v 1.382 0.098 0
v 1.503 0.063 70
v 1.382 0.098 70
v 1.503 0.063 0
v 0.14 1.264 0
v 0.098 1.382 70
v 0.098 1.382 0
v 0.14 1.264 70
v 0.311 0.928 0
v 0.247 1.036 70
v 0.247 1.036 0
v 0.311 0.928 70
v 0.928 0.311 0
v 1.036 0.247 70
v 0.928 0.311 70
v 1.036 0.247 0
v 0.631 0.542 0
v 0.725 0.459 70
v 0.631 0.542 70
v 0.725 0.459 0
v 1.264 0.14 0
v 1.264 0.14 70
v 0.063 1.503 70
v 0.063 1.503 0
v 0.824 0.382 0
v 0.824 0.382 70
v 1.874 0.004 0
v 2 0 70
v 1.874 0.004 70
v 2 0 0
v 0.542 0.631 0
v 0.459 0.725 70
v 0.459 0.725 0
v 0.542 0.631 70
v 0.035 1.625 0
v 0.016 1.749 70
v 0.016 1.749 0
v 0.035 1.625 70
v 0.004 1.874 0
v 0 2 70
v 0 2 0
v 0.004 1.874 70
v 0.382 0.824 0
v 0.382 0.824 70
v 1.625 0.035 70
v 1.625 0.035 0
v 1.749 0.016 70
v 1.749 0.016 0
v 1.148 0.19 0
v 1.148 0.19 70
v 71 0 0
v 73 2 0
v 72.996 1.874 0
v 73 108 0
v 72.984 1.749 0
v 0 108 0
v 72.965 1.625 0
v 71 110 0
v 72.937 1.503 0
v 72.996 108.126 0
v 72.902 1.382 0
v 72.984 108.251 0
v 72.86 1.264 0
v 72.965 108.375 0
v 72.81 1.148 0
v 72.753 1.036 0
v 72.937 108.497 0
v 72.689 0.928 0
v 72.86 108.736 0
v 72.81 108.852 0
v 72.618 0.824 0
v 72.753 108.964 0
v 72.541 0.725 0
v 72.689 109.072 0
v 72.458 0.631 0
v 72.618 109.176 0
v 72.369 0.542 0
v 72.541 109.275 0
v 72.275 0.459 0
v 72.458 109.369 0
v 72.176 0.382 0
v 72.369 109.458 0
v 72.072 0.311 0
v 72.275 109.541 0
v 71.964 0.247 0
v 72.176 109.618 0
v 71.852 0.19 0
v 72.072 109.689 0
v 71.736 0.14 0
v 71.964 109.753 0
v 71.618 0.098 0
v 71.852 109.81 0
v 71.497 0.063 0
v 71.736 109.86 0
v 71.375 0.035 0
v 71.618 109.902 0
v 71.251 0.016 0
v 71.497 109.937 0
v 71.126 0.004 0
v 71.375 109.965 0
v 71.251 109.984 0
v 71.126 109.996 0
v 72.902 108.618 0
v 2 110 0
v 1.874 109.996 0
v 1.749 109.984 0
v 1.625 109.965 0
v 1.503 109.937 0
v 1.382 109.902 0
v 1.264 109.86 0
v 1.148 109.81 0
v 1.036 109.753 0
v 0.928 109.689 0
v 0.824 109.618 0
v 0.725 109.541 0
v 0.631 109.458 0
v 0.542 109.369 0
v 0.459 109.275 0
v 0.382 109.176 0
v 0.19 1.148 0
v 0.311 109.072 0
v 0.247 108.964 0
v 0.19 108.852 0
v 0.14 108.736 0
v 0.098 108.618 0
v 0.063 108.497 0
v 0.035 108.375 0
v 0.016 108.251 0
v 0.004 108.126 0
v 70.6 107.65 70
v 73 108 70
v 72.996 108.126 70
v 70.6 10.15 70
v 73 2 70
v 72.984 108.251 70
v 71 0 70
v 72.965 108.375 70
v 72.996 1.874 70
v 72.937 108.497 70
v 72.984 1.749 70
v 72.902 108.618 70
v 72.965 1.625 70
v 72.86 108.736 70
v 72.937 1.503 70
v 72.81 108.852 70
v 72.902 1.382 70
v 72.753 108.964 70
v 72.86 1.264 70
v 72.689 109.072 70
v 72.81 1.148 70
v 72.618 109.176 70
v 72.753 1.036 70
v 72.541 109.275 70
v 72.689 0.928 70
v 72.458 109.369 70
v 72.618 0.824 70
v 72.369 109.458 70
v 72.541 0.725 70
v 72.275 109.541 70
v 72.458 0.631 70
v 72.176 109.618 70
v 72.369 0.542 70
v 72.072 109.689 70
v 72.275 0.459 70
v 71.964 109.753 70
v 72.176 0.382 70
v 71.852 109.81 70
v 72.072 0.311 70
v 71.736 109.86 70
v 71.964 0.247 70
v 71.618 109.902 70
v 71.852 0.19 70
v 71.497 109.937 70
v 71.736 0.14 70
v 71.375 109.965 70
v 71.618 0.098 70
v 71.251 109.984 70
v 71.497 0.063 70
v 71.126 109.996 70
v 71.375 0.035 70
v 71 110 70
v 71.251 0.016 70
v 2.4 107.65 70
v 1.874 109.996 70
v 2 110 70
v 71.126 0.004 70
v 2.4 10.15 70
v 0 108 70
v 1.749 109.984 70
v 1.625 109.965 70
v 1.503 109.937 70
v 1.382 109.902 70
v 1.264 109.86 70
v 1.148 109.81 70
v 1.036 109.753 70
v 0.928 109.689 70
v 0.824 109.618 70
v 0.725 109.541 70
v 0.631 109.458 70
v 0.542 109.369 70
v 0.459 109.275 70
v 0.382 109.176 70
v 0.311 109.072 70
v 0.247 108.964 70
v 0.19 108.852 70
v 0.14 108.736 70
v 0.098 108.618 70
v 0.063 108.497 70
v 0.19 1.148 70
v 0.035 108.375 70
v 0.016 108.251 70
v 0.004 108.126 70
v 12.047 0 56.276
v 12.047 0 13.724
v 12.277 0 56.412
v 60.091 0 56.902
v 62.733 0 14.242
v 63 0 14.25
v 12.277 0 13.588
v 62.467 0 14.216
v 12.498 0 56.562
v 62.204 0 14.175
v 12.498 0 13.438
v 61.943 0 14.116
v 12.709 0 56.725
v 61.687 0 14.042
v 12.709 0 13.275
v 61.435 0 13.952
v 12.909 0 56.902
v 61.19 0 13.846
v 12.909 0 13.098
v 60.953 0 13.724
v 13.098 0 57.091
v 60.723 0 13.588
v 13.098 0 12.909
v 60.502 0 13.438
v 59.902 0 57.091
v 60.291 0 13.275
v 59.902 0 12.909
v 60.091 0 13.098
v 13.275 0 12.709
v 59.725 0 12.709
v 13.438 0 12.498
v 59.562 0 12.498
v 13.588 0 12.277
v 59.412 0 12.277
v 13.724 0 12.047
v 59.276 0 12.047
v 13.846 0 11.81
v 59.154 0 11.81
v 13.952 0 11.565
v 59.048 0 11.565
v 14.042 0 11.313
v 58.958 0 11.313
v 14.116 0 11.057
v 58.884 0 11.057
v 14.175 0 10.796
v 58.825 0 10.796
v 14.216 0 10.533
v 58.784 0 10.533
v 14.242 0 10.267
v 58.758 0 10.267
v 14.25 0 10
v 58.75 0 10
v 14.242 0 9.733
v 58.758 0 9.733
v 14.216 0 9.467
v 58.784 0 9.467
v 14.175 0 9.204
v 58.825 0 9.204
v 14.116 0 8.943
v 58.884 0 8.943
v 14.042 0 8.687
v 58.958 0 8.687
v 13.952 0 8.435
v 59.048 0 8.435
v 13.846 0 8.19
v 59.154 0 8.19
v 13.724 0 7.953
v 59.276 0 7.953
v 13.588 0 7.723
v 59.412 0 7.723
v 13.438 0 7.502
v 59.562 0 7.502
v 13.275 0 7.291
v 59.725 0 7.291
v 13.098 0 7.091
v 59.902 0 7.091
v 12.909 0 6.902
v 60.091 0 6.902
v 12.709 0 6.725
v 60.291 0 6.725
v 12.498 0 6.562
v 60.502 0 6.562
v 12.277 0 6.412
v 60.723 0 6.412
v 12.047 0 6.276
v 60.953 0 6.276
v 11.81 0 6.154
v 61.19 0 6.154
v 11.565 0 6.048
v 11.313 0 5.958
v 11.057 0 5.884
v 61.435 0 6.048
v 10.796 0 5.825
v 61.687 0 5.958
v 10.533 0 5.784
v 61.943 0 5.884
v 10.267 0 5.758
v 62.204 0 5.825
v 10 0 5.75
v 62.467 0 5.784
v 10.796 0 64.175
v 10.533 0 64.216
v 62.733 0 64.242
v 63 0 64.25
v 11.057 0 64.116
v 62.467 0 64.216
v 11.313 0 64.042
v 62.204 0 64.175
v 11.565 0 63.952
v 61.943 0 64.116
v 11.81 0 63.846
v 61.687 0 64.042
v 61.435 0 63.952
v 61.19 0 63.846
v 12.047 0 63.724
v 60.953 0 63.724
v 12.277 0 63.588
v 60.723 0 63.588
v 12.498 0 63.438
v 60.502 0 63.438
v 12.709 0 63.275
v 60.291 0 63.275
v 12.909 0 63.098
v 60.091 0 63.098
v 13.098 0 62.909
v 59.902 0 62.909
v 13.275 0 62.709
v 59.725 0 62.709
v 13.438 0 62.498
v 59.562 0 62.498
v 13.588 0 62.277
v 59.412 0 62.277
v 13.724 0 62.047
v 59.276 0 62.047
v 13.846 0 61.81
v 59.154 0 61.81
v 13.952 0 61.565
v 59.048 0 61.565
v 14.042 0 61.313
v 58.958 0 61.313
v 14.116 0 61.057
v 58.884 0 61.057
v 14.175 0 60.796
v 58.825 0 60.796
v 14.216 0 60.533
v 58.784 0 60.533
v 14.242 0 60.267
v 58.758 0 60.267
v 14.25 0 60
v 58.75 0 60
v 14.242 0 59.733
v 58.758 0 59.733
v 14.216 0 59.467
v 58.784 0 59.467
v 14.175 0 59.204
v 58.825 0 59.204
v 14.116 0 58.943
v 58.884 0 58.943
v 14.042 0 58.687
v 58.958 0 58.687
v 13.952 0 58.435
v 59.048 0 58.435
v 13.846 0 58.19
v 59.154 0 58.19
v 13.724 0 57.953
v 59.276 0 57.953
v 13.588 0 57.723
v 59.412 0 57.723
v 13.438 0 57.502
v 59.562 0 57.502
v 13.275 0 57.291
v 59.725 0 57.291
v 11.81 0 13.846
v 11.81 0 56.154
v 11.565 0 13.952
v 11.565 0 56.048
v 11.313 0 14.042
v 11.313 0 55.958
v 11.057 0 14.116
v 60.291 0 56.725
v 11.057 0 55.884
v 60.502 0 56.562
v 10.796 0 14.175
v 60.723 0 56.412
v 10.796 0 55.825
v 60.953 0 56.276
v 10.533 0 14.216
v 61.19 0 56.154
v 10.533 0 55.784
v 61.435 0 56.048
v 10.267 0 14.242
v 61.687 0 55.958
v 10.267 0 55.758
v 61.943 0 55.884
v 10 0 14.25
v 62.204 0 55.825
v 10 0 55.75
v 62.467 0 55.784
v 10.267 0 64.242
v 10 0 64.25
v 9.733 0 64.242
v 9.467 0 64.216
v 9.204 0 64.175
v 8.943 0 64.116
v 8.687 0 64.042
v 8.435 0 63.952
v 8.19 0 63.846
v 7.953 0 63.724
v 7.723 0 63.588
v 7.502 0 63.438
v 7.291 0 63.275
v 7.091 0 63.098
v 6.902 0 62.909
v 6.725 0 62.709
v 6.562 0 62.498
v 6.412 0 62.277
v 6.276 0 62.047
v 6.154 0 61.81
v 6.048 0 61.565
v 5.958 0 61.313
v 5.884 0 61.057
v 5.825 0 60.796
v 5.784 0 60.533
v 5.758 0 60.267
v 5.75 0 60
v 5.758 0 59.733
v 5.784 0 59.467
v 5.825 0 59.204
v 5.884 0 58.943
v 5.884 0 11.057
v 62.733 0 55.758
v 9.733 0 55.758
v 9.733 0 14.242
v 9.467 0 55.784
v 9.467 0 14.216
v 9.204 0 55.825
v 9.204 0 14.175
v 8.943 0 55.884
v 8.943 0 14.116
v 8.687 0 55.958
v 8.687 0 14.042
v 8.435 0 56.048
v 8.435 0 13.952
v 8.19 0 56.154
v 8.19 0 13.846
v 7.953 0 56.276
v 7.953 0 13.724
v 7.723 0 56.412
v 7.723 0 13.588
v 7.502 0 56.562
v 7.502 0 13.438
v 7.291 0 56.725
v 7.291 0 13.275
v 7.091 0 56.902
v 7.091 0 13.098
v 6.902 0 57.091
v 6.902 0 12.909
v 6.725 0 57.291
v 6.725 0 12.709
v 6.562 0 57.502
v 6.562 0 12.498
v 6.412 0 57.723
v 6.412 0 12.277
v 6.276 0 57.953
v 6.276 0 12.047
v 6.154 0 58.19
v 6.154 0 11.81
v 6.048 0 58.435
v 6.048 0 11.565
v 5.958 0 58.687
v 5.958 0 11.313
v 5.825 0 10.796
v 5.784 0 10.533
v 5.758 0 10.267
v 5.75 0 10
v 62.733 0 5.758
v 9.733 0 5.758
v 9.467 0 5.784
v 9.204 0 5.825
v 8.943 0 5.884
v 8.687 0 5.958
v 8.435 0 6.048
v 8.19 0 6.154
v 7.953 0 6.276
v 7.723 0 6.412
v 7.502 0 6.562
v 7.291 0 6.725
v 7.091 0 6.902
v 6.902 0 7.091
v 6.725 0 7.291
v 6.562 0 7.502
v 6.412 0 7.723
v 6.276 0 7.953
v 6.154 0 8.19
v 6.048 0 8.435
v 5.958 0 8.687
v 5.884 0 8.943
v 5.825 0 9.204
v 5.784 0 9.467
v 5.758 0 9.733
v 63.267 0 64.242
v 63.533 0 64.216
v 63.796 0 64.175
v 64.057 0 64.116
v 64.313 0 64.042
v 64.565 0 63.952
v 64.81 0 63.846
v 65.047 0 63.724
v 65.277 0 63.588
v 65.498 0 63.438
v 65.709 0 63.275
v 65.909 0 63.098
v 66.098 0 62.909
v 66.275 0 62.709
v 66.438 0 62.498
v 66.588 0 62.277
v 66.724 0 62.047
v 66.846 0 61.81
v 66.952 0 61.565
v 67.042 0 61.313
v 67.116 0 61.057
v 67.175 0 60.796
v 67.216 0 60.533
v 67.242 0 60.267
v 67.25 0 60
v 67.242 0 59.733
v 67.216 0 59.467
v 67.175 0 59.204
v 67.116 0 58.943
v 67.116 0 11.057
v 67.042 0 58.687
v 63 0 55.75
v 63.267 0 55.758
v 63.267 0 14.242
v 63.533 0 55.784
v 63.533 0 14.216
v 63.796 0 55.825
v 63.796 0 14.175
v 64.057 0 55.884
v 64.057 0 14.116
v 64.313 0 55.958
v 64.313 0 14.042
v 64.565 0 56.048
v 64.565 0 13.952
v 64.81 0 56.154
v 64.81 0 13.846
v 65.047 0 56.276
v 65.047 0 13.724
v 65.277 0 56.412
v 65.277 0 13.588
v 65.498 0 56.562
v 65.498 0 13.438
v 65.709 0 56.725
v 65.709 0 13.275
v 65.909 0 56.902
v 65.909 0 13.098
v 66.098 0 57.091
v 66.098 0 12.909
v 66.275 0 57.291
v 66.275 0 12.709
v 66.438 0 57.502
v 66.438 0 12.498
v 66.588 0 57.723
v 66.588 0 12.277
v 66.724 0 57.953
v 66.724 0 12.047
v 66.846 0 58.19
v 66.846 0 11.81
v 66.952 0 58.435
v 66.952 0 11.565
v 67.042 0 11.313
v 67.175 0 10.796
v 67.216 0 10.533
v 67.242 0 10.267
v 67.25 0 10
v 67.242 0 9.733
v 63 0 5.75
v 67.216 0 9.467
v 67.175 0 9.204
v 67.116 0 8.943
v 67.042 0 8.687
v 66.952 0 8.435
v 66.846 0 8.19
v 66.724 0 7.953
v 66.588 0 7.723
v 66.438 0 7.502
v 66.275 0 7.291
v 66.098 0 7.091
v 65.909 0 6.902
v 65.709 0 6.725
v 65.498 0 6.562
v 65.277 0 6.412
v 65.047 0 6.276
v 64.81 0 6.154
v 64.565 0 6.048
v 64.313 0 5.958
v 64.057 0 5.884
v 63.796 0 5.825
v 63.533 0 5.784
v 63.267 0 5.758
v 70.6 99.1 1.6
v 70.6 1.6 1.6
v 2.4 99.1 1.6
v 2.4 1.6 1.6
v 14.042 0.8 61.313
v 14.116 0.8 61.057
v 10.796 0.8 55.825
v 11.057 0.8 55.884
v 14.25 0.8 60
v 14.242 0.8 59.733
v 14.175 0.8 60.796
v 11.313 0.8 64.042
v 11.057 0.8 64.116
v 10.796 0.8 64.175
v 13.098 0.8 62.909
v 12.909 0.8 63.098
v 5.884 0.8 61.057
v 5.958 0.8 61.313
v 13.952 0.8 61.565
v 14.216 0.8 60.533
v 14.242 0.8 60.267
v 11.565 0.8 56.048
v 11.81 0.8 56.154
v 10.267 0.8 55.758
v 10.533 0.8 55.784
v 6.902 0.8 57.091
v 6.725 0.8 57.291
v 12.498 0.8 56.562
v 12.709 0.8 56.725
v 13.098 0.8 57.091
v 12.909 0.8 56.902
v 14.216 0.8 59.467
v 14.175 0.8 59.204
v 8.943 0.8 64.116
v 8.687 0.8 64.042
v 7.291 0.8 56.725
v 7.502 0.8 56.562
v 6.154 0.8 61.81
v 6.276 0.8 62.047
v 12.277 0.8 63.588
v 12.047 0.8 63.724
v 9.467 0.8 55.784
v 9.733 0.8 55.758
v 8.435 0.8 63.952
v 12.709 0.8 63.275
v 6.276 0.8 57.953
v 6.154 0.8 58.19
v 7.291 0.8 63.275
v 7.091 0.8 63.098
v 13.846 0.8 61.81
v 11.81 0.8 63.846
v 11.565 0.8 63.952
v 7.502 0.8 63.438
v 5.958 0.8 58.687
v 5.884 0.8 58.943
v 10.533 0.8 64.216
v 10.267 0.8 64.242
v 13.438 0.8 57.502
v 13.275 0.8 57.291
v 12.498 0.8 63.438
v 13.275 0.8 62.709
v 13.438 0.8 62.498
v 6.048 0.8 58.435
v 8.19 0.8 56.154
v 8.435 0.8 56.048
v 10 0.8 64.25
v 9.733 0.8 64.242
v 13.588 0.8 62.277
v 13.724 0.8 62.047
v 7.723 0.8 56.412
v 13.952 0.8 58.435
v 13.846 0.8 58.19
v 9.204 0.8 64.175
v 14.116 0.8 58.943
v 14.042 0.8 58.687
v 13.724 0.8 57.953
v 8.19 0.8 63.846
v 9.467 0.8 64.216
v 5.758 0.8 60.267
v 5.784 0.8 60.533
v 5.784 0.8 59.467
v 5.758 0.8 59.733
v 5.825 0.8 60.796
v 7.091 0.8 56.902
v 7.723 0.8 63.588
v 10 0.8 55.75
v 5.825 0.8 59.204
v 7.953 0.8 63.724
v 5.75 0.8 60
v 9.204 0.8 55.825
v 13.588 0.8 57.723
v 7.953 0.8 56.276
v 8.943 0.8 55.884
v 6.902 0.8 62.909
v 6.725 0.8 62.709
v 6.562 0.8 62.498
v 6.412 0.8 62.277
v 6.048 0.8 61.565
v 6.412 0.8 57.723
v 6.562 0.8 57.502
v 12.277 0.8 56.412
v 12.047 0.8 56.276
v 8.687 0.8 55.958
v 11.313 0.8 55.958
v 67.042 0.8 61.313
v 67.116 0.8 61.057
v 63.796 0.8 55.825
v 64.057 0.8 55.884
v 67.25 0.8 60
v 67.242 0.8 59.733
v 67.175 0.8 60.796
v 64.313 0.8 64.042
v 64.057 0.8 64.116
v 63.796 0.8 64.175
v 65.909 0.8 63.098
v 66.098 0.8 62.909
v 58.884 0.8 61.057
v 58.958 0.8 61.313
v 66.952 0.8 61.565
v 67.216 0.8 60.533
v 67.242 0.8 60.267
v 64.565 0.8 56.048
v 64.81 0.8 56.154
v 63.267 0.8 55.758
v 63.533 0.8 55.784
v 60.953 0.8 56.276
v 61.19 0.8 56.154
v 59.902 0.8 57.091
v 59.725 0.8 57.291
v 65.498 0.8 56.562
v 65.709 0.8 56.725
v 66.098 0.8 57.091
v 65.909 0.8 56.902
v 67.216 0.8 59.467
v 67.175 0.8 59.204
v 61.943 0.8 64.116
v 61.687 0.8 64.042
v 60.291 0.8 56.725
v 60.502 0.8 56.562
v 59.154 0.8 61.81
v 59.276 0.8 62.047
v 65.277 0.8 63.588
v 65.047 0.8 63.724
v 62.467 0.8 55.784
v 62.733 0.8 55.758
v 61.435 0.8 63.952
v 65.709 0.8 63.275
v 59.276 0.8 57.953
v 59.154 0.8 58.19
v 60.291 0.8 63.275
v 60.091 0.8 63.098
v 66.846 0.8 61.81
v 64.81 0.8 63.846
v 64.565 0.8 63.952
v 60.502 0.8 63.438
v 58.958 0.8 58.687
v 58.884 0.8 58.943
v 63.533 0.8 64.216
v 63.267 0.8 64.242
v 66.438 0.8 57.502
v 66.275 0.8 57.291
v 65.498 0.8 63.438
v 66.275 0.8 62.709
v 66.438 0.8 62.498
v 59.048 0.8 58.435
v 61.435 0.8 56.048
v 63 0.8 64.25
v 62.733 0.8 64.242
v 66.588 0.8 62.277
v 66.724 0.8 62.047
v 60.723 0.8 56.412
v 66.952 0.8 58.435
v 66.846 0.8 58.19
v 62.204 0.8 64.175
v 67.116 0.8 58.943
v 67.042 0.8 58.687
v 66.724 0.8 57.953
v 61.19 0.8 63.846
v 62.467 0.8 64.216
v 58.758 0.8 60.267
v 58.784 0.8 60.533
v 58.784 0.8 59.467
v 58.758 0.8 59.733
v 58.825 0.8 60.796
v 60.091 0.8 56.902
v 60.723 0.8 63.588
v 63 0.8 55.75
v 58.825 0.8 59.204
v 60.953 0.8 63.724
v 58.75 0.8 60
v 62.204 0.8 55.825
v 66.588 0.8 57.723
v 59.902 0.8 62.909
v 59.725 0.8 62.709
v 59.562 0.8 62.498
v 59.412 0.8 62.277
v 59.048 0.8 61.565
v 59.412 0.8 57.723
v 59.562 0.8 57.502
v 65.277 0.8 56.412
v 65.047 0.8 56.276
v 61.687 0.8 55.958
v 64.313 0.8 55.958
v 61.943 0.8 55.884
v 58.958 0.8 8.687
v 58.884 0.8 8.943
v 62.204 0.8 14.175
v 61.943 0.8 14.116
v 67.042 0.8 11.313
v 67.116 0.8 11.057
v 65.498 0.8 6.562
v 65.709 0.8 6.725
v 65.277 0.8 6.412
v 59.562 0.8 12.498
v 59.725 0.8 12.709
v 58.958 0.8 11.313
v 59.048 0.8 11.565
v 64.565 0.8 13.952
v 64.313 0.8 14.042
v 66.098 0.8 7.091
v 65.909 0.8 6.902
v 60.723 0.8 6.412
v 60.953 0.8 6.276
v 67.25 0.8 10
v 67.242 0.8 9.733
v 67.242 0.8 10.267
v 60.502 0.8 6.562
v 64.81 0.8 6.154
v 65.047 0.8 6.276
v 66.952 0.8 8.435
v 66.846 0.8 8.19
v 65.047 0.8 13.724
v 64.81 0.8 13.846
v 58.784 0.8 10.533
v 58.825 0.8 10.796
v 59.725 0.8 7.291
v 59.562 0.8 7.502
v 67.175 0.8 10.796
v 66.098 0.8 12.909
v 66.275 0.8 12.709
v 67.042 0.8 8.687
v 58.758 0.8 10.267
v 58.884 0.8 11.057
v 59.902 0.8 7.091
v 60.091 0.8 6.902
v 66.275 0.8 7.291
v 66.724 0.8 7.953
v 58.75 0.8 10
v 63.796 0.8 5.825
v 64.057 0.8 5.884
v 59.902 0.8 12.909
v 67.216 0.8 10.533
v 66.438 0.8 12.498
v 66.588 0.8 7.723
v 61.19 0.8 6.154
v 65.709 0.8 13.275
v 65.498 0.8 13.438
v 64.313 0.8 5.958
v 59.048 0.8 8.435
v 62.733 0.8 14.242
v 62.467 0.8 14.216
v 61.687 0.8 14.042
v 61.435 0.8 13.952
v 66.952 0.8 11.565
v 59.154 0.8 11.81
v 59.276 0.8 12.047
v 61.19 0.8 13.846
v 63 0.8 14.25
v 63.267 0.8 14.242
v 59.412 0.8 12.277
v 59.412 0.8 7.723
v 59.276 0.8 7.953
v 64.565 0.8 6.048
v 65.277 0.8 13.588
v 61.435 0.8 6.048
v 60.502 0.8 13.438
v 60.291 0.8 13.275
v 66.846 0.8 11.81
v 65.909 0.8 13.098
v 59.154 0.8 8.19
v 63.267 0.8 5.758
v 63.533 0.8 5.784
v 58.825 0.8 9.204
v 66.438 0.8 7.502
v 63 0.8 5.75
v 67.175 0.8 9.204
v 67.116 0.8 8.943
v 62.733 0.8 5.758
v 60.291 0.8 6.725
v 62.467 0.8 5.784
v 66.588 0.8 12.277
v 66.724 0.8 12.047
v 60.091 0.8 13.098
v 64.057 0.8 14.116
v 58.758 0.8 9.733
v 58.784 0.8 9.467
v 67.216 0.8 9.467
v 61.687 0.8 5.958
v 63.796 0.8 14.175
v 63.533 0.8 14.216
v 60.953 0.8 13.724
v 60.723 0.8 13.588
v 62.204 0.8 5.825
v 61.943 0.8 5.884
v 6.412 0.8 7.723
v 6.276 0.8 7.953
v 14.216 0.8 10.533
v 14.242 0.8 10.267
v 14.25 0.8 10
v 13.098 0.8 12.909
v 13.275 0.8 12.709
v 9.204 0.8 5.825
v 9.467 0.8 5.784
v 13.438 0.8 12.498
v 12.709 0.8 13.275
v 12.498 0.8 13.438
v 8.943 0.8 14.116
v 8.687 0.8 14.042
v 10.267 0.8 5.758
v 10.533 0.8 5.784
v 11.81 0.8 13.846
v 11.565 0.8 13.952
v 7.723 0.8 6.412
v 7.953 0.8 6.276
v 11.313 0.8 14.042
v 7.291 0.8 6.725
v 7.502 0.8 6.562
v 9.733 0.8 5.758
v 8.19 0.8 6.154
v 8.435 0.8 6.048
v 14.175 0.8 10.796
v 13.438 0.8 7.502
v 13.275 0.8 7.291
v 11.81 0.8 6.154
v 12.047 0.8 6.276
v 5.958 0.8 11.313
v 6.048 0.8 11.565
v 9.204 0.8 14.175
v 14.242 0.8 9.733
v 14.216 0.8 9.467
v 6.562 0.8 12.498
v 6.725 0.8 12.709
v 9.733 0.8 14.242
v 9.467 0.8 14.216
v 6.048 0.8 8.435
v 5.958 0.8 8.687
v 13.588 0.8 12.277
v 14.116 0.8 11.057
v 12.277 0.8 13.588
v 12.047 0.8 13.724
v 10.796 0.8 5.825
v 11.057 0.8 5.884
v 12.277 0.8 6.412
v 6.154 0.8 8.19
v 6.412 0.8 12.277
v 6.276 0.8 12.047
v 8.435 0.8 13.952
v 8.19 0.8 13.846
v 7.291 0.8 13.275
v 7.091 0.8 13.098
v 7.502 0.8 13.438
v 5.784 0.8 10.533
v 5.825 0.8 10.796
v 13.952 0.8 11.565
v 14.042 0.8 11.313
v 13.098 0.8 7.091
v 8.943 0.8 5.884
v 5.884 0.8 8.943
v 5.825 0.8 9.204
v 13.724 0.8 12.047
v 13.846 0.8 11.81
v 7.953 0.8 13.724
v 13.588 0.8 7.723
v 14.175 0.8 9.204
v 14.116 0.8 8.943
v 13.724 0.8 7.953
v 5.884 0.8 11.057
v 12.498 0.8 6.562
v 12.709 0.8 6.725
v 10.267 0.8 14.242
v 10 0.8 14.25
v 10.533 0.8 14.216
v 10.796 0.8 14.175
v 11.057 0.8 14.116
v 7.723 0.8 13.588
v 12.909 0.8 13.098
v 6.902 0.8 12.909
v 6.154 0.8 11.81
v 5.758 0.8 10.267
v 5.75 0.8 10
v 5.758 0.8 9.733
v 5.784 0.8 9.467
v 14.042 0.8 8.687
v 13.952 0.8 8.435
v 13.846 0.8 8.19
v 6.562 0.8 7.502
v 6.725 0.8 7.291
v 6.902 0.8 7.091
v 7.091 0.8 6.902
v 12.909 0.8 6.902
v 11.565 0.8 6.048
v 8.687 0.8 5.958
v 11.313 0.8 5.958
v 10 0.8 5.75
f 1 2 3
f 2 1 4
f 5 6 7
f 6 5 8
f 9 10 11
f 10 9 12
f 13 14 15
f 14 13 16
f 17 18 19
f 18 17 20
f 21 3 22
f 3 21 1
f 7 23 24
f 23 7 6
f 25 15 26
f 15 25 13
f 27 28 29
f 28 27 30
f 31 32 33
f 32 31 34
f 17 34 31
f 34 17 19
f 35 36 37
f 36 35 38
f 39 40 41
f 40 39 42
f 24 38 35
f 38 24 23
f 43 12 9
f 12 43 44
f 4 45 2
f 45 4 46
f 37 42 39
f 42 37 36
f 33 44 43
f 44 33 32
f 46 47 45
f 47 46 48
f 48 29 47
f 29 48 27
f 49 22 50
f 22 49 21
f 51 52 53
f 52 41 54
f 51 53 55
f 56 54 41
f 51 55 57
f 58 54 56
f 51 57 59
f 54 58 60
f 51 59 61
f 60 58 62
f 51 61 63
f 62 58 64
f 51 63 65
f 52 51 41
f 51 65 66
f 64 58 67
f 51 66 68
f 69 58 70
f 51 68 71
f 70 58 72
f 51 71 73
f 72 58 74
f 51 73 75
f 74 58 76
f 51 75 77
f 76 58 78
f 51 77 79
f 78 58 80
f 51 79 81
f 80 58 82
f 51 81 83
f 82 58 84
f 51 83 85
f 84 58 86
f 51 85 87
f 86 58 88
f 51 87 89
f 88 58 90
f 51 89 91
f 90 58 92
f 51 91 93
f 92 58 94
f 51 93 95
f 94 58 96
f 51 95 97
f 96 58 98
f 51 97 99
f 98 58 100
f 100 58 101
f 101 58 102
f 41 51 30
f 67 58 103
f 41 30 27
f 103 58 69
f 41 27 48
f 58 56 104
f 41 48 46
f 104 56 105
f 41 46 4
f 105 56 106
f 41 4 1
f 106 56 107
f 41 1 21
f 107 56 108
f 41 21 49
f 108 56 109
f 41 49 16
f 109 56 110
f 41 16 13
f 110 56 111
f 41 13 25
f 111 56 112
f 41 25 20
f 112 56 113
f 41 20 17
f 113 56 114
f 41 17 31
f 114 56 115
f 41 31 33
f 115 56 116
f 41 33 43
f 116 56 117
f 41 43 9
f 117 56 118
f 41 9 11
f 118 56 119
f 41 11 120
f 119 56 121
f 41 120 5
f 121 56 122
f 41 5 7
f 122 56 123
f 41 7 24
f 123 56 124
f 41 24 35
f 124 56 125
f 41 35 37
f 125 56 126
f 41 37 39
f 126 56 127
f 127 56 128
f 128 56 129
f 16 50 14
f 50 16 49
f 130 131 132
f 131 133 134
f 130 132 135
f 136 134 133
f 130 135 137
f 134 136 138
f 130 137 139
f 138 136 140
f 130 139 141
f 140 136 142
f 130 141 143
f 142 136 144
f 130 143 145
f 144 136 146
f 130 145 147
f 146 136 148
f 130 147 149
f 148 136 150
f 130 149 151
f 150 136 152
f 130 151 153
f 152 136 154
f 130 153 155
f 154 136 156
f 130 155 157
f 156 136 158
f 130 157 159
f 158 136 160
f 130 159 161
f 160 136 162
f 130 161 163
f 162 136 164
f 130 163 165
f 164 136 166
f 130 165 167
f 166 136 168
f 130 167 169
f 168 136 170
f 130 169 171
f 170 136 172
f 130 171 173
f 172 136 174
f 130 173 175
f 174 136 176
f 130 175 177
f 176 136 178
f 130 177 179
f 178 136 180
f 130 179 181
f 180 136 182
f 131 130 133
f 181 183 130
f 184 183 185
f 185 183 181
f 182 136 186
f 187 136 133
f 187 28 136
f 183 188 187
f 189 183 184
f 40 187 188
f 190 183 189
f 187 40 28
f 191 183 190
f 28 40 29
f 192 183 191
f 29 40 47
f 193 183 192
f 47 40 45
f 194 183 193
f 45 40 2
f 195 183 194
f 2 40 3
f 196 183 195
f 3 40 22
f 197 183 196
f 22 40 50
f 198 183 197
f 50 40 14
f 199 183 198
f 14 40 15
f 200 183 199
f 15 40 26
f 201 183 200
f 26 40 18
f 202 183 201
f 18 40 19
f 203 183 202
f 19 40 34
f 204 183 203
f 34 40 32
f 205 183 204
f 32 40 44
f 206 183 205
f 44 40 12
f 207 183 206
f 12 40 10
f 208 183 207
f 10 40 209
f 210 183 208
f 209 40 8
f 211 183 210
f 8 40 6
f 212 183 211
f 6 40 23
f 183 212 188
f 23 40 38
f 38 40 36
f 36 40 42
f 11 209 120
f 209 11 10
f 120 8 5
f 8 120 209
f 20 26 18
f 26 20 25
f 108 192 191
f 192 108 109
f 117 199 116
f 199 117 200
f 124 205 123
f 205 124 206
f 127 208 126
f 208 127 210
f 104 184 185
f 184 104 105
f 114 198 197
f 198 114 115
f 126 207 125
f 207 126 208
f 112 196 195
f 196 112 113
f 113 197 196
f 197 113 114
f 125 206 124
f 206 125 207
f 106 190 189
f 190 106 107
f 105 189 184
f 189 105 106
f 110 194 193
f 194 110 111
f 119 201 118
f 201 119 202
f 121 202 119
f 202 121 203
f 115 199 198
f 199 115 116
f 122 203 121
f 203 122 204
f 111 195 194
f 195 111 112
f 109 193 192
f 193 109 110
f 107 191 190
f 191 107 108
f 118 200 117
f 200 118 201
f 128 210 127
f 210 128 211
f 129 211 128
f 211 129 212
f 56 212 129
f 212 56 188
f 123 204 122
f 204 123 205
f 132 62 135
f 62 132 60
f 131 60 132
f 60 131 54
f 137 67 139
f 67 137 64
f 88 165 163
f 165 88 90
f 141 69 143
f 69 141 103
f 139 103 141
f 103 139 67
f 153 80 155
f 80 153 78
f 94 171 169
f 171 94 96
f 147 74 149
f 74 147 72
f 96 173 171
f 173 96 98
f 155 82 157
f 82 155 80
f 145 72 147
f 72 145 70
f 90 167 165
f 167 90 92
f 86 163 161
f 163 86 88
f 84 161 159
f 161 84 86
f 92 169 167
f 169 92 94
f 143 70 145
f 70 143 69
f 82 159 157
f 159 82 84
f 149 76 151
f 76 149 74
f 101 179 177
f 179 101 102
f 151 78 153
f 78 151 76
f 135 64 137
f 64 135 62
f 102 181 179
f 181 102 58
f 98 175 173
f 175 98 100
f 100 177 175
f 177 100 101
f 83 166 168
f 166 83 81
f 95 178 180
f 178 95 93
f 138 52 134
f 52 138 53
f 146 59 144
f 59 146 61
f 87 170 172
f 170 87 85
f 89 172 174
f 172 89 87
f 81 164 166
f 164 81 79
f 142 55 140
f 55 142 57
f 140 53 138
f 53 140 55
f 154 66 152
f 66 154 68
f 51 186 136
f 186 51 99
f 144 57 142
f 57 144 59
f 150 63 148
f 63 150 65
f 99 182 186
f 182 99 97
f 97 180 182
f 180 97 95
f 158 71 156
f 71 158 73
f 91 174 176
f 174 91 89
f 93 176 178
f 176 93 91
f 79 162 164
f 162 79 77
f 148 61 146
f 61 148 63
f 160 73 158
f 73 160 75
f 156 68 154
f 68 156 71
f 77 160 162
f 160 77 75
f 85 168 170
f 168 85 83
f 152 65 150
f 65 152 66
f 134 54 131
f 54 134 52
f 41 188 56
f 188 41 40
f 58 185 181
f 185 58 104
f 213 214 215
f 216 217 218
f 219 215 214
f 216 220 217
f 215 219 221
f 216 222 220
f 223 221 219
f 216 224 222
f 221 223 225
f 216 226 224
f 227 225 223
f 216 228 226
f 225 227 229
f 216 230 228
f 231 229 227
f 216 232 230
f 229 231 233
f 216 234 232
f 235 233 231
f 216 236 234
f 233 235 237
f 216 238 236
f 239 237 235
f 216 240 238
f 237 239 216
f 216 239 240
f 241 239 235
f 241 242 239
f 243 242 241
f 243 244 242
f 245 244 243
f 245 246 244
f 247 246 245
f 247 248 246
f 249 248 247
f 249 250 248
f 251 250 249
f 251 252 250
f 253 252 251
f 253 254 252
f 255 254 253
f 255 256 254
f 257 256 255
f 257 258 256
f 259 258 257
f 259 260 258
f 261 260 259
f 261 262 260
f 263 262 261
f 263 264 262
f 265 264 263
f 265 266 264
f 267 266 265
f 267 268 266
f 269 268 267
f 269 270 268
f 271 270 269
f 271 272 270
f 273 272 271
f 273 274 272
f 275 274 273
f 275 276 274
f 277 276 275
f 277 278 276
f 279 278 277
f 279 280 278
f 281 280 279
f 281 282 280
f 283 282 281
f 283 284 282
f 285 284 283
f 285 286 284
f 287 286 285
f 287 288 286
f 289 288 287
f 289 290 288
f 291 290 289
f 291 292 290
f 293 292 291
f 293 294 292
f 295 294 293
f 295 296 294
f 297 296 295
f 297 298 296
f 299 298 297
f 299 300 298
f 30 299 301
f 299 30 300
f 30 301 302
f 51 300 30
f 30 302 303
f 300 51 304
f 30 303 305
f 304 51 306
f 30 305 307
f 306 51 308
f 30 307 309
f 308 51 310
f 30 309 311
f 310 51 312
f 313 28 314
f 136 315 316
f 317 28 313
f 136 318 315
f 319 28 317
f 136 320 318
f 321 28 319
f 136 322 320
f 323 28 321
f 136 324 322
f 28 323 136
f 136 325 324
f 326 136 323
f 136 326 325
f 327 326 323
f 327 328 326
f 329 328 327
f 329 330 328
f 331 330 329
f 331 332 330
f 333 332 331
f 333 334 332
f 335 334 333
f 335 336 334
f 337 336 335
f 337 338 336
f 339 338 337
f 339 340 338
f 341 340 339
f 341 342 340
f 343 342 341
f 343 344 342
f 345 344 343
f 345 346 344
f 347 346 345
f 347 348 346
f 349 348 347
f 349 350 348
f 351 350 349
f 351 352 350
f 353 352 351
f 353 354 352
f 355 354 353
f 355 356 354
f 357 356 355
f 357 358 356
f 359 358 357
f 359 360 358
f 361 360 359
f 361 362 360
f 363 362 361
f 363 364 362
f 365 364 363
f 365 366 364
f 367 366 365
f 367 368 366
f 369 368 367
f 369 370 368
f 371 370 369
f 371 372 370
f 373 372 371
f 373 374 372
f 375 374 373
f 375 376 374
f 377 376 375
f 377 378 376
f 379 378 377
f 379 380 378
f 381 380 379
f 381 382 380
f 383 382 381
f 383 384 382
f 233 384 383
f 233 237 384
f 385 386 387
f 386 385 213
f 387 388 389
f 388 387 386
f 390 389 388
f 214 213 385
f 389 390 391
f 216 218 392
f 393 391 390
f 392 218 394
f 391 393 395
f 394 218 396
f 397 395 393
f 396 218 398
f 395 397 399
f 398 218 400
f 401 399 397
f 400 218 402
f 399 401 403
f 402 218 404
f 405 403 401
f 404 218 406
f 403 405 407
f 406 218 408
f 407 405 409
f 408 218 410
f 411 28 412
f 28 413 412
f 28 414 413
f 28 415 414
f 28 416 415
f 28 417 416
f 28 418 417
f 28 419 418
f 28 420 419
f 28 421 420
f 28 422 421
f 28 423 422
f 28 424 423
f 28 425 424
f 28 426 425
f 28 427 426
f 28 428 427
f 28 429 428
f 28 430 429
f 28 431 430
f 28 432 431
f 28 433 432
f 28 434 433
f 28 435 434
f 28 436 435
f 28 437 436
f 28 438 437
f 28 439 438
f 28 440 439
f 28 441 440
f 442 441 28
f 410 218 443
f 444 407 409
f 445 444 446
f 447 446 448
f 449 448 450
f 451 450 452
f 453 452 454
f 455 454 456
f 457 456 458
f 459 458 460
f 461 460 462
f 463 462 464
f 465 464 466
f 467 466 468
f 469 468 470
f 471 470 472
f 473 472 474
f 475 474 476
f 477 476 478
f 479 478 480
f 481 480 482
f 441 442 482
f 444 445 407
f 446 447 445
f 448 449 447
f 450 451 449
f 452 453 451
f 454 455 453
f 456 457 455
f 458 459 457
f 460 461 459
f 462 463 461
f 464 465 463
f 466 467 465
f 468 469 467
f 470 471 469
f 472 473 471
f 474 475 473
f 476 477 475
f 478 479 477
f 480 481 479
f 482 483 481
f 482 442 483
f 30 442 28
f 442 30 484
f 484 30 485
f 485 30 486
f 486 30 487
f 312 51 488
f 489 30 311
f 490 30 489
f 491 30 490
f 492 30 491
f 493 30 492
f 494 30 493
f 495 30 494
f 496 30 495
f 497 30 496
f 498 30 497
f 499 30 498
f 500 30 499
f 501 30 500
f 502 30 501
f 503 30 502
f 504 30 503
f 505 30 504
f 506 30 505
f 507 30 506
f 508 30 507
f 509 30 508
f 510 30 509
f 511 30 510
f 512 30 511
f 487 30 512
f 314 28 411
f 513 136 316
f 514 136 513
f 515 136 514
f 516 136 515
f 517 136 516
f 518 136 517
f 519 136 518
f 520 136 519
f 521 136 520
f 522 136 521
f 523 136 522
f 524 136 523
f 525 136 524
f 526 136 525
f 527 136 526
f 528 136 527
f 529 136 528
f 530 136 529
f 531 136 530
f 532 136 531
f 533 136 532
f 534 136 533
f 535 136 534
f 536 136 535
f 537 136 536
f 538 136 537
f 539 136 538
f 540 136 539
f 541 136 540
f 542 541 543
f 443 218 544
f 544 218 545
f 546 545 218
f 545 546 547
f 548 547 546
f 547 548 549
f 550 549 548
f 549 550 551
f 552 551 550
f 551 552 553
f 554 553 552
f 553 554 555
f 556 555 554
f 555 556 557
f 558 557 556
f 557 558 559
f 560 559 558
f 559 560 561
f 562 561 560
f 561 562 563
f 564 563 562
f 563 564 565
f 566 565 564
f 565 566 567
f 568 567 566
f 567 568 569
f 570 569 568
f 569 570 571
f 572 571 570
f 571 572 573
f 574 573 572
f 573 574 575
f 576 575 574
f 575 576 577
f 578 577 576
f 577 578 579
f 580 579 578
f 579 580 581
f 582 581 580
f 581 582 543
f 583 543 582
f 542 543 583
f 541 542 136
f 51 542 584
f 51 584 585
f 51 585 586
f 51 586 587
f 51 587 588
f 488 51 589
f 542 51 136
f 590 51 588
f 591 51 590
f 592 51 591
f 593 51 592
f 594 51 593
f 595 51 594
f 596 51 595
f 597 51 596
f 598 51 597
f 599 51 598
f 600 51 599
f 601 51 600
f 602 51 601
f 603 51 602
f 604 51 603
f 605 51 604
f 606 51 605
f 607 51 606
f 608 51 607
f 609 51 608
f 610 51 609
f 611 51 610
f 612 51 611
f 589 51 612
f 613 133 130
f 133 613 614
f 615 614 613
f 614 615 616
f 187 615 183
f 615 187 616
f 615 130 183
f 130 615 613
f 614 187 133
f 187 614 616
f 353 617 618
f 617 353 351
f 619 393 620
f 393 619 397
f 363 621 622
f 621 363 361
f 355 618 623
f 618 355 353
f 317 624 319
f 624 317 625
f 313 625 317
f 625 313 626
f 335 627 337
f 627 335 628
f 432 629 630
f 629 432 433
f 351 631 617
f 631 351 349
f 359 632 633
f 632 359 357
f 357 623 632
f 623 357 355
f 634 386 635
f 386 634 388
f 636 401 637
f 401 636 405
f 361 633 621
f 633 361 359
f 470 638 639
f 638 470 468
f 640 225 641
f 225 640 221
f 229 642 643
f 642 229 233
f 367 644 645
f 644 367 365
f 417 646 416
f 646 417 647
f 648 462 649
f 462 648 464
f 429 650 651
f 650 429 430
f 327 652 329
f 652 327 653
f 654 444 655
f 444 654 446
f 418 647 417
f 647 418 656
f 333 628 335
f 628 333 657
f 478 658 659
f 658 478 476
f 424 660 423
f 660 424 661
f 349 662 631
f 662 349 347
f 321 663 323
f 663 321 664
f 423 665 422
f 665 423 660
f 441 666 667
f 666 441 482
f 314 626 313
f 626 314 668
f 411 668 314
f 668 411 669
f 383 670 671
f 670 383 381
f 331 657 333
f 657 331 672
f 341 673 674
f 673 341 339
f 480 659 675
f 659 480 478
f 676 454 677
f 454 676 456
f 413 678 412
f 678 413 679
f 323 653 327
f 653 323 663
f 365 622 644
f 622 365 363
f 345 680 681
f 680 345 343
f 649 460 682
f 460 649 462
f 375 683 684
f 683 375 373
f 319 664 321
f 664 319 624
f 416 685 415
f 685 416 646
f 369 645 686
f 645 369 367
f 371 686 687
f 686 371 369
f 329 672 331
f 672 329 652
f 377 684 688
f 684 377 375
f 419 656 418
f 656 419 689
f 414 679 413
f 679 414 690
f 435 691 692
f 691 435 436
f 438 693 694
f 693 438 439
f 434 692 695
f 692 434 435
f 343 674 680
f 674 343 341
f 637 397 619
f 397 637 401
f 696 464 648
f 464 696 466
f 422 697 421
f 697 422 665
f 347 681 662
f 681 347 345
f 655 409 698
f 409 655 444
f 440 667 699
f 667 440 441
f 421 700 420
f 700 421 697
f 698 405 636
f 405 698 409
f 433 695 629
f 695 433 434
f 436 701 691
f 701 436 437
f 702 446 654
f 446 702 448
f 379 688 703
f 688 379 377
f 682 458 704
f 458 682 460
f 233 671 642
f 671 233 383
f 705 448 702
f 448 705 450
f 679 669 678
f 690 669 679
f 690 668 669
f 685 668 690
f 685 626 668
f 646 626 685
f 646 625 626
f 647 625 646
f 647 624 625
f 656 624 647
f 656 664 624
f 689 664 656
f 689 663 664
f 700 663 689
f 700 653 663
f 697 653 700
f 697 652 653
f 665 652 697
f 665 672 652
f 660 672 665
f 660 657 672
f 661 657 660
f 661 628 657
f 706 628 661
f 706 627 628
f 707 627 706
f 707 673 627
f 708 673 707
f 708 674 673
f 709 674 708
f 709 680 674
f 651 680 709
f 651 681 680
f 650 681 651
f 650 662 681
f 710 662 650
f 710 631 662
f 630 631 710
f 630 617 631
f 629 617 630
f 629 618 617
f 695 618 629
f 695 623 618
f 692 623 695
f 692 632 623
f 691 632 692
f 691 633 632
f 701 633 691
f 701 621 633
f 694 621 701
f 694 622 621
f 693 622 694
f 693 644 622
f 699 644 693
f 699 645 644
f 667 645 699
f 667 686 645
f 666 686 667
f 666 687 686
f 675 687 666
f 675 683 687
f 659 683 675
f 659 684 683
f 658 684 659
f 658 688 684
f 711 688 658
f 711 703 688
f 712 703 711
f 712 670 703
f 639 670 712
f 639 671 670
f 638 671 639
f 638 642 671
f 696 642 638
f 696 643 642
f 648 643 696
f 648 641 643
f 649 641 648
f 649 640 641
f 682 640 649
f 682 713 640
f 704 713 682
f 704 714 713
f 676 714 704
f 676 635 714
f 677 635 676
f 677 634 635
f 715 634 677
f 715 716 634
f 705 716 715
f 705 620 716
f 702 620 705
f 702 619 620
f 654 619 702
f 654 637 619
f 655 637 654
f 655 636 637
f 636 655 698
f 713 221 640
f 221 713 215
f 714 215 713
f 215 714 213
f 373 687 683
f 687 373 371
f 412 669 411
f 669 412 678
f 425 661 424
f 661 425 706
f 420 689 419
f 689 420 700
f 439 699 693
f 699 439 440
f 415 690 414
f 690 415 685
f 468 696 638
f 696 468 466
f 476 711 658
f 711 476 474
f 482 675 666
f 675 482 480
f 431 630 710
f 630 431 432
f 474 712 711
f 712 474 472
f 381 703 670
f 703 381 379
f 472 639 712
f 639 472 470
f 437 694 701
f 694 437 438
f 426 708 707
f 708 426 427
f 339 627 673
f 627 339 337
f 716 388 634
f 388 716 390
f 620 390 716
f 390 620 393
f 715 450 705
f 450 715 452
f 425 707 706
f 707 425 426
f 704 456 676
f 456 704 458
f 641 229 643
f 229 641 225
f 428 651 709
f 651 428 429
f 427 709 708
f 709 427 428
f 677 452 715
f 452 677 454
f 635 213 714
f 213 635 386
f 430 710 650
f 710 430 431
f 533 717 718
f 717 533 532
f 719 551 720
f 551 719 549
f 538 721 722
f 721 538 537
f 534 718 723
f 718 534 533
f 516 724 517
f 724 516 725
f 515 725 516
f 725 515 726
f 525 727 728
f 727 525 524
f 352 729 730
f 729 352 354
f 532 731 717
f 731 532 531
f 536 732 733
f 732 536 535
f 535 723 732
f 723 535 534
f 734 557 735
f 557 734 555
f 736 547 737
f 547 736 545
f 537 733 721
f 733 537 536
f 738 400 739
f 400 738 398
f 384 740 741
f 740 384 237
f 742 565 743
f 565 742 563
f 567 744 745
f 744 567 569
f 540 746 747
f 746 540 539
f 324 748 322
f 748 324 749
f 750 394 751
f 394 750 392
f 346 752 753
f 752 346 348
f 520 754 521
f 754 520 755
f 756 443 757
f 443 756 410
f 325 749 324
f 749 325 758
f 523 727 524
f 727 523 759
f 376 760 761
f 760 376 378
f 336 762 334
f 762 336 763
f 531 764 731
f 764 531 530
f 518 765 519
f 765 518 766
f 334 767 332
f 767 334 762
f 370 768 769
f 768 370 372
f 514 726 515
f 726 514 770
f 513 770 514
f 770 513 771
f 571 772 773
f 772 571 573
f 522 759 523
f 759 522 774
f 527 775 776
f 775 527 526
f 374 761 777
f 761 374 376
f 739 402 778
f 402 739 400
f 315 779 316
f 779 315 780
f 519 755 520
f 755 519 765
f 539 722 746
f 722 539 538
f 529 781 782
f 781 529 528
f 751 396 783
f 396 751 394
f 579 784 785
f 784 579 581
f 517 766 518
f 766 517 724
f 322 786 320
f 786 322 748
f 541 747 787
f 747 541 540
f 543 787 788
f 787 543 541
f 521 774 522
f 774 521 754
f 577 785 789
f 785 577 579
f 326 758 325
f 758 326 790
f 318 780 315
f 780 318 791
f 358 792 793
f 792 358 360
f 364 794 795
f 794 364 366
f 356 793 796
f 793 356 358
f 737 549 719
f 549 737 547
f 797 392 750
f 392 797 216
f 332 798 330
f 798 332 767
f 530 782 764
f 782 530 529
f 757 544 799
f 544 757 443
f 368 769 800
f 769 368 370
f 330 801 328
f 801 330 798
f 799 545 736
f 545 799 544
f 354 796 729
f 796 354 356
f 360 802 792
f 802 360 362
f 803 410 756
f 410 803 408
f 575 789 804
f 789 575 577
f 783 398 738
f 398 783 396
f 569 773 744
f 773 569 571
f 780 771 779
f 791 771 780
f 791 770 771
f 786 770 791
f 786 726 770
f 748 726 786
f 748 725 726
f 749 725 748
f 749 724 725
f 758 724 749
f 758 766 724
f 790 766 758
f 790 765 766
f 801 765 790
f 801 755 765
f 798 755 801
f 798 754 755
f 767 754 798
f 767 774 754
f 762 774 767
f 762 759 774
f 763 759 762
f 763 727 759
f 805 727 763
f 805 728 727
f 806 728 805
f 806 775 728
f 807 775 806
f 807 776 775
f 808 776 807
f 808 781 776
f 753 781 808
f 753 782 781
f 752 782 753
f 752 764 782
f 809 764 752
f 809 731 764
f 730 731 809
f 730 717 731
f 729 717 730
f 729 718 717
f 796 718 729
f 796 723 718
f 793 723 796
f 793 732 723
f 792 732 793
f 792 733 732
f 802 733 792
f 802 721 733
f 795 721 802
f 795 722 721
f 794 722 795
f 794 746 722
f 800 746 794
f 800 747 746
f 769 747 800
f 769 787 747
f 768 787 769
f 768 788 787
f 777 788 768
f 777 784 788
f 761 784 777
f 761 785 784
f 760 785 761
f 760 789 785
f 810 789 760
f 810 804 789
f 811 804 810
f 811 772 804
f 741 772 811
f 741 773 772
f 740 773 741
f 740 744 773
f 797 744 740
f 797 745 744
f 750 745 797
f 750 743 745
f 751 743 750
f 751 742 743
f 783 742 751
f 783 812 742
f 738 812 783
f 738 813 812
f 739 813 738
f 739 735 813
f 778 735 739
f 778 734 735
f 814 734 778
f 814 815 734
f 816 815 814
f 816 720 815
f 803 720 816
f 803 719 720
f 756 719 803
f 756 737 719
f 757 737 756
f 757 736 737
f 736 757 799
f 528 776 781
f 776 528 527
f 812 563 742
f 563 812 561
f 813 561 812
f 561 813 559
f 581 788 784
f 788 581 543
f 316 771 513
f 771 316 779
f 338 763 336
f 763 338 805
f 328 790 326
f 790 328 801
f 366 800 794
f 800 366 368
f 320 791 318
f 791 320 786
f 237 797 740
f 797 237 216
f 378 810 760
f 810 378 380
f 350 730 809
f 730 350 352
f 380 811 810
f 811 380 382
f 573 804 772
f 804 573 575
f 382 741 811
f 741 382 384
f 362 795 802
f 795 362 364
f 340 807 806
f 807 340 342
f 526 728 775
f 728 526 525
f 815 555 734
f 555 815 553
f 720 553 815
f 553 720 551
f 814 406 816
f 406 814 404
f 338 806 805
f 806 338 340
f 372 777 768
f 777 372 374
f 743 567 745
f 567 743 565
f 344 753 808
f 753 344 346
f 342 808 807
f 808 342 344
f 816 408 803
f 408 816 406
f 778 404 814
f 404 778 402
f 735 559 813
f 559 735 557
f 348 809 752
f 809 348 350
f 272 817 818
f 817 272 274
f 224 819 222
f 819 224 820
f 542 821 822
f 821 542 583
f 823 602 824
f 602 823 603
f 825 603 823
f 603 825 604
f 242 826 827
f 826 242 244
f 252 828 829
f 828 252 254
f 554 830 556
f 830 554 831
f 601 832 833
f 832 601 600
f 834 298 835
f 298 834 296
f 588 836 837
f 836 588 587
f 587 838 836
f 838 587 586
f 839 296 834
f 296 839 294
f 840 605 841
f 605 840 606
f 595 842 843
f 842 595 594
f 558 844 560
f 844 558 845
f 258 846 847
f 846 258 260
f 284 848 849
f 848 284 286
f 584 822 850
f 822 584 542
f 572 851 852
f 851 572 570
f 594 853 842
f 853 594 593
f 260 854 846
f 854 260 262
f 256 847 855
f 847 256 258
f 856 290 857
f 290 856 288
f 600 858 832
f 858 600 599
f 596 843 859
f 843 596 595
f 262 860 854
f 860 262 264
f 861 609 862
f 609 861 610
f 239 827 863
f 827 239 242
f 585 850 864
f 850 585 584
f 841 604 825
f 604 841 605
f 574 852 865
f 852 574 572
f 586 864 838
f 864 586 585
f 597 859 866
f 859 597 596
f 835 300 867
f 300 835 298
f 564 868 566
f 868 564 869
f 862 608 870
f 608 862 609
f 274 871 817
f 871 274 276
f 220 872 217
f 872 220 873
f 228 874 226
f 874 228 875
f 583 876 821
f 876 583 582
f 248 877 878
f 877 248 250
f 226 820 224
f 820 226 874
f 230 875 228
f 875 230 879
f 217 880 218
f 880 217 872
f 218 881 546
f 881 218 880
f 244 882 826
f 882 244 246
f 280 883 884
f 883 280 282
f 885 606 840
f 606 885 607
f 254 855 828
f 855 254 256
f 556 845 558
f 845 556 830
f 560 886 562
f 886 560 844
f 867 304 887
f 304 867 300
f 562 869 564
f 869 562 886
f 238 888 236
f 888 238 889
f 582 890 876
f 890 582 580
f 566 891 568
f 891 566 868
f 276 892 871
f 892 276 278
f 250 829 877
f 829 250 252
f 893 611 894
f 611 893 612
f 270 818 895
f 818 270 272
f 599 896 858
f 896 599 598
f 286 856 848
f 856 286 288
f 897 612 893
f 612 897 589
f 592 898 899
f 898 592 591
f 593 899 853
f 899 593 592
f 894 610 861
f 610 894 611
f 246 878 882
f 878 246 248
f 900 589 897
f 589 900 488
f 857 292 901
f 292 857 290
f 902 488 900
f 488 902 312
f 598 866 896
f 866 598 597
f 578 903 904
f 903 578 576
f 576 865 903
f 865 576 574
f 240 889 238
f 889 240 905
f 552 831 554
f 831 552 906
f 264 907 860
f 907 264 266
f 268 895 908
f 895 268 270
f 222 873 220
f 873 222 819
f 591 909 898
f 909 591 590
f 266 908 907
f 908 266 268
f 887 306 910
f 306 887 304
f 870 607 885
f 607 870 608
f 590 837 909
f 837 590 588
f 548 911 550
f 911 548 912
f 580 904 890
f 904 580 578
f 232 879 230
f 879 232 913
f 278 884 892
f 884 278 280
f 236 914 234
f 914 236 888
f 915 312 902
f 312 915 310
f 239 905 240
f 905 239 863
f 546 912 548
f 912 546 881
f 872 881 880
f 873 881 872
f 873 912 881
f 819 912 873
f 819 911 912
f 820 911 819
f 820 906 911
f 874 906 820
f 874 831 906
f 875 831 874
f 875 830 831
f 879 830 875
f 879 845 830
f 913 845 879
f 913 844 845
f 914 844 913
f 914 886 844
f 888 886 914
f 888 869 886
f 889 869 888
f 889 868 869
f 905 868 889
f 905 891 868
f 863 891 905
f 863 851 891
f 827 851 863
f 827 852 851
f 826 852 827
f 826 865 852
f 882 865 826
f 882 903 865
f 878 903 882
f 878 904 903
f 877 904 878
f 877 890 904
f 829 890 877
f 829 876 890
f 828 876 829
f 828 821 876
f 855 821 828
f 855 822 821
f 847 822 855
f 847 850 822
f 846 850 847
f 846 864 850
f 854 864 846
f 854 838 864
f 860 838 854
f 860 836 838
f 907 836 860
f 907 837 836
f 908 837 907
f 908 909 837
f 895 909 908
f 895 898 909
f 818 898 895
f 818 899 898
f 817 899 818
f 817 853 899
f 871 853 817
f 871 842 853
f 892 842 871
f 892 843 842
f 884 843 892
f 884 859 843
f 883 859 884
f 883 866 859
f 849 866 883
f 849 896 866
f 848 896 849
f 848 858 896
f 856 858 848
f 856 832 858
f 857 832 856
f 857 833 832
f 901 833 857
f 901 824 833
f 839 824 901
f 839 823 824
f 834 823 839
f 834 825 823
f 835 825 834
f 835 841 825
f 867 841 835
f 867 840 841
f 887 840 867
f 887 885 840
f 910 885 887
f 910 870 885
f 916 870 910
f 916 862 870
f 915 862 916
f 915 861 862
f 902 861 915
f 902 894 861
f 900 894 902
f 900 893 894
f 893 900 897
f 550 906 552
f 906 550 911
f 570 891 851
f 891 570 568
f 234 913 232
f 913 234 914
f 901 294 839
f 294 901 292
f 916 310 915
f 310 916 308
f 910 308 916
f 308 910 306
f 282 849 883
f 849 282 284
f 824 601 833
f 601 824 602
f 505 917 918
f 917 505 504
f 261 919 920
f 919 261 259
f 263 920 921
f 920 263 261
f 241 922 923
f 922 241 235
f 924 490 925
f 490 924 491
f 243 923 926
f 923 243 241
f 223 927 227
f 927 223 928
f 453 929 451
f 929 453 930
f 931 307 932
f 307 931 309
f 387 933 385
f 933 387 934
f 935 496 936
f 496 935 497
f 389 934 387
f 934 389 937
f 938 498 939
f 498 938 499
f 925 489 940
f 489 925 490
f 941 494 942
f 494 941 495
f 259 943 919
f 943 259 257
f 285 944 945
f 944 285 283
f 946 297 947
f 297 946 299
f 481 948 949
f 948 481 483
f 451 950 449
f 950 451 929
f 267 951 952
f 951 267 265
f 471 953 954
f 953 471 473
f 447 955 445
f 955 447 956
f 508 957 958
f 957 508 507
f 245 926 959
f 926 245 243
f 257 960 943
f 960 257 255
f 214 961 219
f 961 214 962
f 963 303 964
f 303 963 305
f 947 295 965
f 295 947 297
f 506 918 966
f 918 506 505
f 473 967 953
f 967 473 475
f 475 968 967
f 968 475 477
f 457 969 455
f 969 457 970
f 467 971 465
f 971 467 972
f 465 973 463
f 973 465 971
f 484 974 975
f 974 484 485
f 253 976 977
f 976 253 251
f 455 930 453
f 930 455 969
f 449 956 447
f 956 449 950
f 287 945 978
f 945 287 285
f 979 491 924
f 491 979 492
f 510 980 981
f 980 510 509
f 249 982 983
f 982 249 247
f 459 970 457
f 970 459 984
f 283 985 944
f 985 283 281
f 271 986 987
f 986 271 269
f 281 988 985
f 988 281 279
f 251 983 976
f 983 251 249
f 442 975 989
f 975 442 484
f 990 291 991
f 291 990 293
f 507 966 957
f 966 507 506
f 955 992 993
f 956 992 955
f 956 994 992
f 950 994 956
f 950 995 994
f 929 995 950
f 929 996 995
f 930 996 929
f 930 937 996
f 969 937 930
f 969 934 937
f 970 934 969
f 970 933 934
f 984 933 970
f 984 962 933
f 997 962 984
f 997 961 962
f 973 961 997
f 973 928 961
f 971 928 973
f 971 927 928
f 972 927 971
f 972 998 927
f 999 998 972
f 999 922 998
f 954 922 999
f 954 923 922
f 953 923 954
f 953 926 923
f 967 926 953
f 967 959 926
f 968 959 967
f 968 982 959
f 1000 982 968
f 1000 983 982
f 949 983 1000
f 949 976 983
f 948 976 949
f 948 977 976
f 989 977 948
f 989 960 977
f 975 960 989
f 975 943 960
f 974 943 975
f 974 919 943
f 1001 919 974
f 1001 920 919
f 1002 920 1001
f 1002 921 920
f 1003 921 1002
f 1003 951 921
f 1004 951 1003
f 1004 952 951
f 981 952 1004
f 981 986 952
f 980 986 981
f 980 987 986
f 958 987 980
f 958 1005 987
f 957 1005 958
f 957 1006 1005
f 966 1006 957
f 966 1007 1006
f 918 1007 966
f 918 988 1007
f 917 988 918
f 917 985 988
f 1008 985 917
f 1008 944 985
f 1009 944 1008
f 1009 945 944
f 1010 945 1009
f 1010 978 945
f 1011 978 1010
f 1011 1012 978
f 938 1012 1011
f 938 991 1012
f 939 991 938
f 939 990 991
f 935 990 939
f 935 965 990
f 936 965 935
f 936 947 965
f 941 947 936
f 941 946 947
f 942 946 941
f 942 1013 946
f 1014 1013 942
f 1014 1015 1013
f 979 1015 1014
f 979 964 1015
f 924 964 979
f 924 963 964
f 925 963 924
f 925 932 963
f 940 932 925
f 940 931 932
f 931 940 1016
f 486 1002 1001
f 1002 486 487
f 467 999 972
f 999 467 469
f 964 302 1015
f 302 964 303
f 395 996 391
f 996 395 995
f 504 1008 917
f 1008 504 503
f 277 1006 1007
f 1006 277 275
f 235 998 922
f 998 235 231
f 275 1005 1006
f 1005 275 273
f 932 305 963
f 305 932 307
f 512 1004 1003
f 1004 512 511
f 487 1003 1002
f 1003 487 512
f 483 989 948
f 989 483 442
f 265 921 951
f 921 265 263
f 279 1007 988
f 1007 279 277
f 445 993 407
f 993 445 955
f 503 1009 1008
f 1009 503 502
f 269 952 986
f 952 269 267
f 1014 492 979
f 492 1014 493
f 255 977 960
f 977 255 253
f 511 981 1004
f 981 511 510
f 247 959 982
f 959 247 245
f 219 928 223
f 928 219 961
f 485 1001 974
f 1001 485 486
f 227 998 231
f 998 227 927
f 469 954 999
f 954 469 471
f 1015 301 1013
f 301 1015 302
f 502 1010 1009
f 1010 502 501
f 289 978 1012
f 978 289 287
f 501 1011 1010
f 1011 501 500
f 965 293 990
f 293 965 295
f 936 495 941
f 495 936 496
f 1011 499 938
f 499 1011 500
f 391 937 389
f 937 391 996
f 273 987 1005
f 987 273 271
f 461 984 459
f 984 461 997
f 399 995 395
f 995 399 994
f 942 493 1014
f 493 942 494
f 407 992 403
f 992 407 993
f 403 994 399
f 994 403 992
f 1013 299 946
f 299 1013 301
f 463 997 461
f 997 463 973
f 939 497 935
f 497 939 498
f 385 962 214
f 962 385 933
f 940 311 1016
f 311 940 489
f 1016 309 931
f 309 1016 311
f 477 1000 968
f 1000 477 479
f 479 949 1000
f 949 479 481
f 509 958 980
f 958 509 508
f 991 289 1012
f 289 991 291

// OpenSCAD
$fn = 100;

x1 = 73;
y1 = 110;

x2 = 100;
y2 = 68.5;

zc = 70;

cmin = 67.5;
w = 1.6;

module main_cards() {
    difference() {
        cube_rounded([x1,y1,zc]);
        translate([1.5*w,w,w]) scheren([0,0.5,4]) cube([x1-3*w,y1-12.5,zc]);
        // feet
        rf=8.5/2;
        fo=10;
        translate([fo,0.8,zc-fo]) rotate([90,0,0]) cylinder(h=2, r=rf);
        translate([x1-fo,0.8,zc-fo]) rotate([90,0,0]) cylinder(h=2, r=rf);
        translate([x1-fo,0.8,fo]) rotate([90,0,0]) cylinder(h=2, r=rf);
        translate([fo,0.8,fo]) rotate([90,0,0]) cylinder(h=2, r=rf);
    }
}
main_cards();

t3=55;
module treasure(t=5) {
    difference() {
        cube_rounded([t3+2*w,t3+2*w,2*t+w]);
        translate([w,w,w]) cube_rounded([t3,t3,2*t+w], r=2-w);
    }
}
module treasure_lid(t=5) {
    s=0.5;
    // translate([-(t3+2*w+s+2*w)/2,-(t3+2*w+s+2*w)/2,-0.8]) cube_rounded([t3+2*w+s+2*w,t3+2*w+s+2*w,0.8]);
    difference() {
        translate([-(t3+2*w+s+2*w)/2,-(t3+2*w+s+2*w)/2,0]) difference() {
            cube_rounded([t3+2*w+s+2*w,t3+2*w+s+2*w,2*t+w+w]);
            translate([w,w,w]) cube_rounded([t3+2*w+s,t3+2*w+s,2*t+w+1], r=2-w);
        }
        translate([-30/2,-(t3+2*w+s+2*w)/2-1,w]) union() {
            cube_rounded2([30,100,30]);
            translate([-2,100,2*t+w-2]) rotate([90,0,0]) difference() {
                cube([3,3,100]);
                cylinder(h=100,r=2);
            }
            translate([30+2,100,2*t+w-2]) rotate([90,0,0]) difference() {
                translate([-3,0,0]) cube([3,3,100]);
                cylinder(h=100,r=2);
            }
        }
        rotate([0,0,90]) translate([-30/2,-(t3+2*w+s+2*w)/2-1,w]) union() {
            cube_rounded2([30,100,30]);
            translate([-2,100,2*t+w-2]) rotate([90,0,0]) difference() {
                cube([3,3,100]);
                cylinder(h=100,r=2);
            }
            translate([30+2,100,2*t+w-2]) rotate([90,0,0]) difference() {
                translate([-3,0,0]) cube([3,3,100]);
                cylinder(h=100,r=2);
            }
        }
    }
}
// treasure_lid();

module cube_rounded2(v, r=2, center=false){
    translate([0,v[1],0]) rotate([90,0,0]) cube_rounded([v[0],v[2],v[1]]);
}

module cube_rounded(v, r=2, center=false){
    translate(center==true ? [r-v[0]/2,r-v[1]/2,-v[2]/2] : [r,r,0])
    union(){
        cylinder(h = v[2], r = r);
        translate(v = [0,v[1]-2*r,0]) cylinder(h = v[2], r = r);
        translate(v = [v[0]-2*r,v[1]-2*r,0]) cylinder(h = v[2], r = r);
        translate(v = [v[0]-2*r,0,0]) cylinder(h = v[2], r = r);
        translate(v = [-r,0,0]) cube([v[0],v[1]-2*r,v[2]]);
        translate(v = [0,-r,0]) cube([v[0]-2*r,v[1],v[2]]);
    }
}

module scheren(v) {
    multmatrix([[1,0,v[0]/v[2],0],[0,1,v[1]/v[2],0],[0,0,1,0]]) children();
}
